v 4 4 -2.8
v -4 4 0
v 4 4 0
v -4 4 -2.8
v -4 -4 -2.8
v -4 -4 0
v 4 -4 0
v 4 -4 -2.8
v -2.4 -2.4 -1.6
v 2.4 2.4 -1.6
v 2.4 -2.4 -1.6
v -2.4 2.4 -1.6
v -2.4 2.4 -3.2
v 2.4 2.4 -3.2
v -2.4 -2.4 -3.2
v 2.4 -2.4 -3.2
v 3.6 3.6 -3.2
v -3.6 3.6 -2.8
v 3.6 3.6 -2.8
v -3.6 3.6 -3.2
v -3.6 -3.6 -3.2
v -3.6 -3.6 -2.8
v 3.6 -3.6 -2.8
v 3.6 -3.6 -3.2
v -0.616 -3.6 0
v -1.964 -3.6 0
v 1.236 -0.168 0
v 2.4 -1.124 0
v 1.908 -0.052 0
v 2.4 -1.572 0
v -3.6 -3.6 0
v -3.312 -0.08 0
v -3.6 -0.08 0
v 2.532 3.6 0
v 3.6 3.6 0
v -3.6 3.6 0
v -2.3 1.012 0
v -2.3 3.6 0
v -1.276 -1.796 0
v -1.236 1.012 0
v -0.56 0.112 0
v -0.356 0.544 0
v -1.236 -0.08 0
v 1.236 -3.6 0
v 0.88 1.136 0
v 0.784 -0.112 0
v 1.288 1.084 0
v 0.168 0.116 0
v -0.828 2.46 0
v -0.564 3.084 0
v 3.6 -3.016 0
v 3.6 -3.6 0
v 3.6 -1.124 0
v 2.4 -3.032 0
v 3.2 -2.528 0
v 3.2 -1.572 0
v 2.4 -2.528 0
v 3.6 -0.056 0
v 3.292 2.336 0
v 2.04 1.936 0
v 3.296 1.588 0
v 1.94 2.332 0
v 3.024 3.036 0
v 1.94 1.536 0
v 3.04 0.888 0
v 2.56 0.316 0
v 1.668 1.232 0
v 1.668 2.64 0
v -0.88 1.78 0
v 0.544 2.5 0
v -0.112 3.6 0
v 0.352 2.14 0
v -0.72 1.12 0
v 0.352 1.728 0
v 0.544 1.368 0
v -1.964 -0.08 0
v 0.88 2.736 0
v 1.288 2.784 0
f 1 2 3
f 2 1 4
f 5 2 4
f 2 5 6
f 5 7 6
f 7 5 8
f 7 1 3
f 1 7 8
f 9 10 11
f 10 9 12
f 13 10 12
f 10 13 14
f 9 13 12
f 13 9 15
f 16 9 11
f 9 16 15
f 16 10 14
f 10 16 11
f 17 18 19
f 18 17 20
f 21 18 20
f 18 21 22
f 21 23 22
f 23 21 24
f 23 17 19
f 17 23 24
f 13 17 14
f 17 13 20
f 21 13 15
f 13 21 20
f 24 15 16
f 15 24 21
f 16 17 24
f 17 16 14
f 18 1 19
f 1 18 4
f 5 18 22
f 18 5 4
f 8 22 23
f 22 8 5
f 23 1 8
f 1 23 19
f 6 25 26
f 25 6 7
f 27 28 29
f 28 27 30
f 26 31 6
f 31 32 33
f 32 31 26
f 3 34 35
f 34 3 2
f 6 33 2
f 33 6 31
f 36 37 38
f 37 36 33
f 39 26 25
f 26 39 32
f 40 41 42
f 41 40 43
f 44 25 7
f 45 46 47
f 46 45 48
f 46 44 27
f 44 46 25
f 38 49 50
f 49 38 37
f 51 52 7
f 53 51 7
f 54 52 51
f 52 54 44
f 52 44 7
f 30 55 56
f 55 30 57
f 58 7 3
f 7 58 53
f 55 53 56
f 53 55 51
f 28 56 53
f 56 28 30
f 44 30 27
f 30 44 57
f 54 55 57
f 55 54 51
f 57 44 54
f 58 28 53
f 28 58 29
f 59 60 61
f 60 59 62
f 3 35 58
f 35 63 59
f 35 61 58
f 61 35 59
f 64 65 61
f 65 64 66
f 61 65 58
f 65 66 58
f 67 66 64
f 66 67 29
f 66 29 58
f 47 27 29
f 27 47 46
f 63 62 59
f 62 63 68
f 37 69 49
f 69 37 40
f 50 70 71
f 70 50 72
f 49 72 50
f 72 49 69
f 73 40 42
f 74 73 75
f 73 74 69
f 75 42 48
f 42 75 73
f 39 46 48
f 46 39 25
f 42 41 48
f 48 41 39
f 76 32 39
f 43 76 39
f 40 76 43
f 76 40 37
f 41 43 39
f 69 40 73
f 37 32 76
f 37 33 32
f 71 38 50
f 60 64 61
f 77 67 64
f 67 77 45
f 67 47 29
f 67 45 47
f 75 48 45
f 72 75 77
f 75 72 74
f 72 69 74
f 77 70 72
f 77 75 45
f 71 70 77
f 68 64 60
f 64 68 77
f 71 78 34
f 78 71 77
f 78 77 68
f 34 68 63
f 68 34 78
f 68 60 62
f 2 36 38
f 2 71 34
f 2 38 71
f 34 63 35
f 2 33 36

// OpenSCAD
// file: ../p/4-4edge.scad
use <../lib.scad>
$fa=1; $fs=0.2;
function ldraw_lib__4_4edge(realsolid=false) = [
// 0 Circle 1.0
// 0 Name: 4-4edge.dat
// 0 Author: James Jessiman
// 0 !LDRAW_ORG Primitive UPDATE 2017-01
// 0 !LICENSE Licensed under CC BY 2.0 and CC BY 4.0 : see CAreadme.txt
// 
// 0 BFC CERTIFY CCW
  [0,"BFC","CERTIFY"],
  [0,"BFC","CCW"],
// 
// 0 !HISTORY 1998-12-15 [PTadmin] Official Update 1998-10
// 0 !HISTORY 2005-12-28 [PTadmin] Official Update 2005-01
// 0 !HISTORY 2007-06-24 [PTadmin] Header formatted for Contributor Agreement
// 0 !HISTORY 2008-07-01 [PTadmin] Official Update 2008-01
// 0 !HISTORY 2017-01-15 [Steffen] BFCed
// 0 !HISTORY 2017-12-30 [PTadmin] Official Update 2017-01
// 
// 
// 2 24 1 0 0 0.9239 0 0.3827
  [2,24,1,0,0,0.9239,0,0.3827],
// 2 24 0.9239 0 0.3827 0.7071 0 0.7071
  [2,24,0.9239,0,0.3827,0.7071,0,0.7071],
// 2 24 0.7071 0 0.7071 0.3827 0 0.9239
  [2,24,0.7071,0,0.7071,0.3827,0,0.9239],
// 2 24 0.3827 0 0.9239 0 0 1
  [2,24,0.3827,0,0.9239,0,0,1],
// 2 24 0 0 1 -0.3827 0 0.9239
  [2,24,0,0,1,-0.3827,0,0.9239],
// 2 24 -0.3827 0 0.9239 -0.7071 0 0.7071
  [2,24,-0.3827,0,0.9239,-0.7071,0,0.7071],
// 2 24 -0.7071 0 0.7071 -0.9239 0 0.3827
  [2,24,-0.7071,0,0.7071,-0.9239,0,0.3827],
// 2 24 -0.9239 0 0.3827 -1 0 -0
  [2,24,-0.9239,0,0.3827,-1,0,-0],
// 2 24 -1 0 -0 -0.9239 0 -0.3827
  [2,24,-1,0,-0,-0.9239,0,-0.3827],
// 2 24 -0.9239 0 -0.3827 -0.7071 0 -0.7071
  [2,24,-0.9239,0,-0.3827,-0.7071,0,-0.7071],
// 2 24 -0.7071 0 -0.7071 -0.3827 0 -0.9239
  [2,24,-0.7071,0,-0.7071,-0.3827,0,-0.9239],
// 2 24 -0.3827 0 -0.9239 0 0 -1
  [2,24,-0.3827,0,-0.9239,0,0,-1],
// 2 24 0 0 -1 0.3827 0 -0.9239
  [2,24,0,0,-1,0.3827,0,-0.9239],
// 2 24 0.3827 0 -0.9239 0.7071 0 -0.7071
  [2,24,0.3827,0,-0.9239,0.7071,0,-0.7071],
// 2 24 0.7071 0 -0.7071 0.9239 0 -0.3827
  [2,24,0.7071,0,-0.7071,0.9239,0,-0.3827],
// 2 24 0.9239 0 -0.3827 1 0 0
  [2,24,0.9239,0,-0.3827,1,0,0],
];
module ldraw_lib__4_4edge(step=0, col=false, unit=2/5, alt=false, line=0.2, solid=!$preview)
    makepoly(ldraw_lib__4_4edge(solid), step=step, col=col, unit=unit, alt=alt, line=line, solid=solid);
ldraw_lib__4_4edge(line=0.2);
// file: ../p/4-4disc.scad
use <../lib.scad>
$fa=1; $fs=0.2;
function ldraw_lib__4_4disc(realsolid=false) = [
// 0 Disc 1.0
// 0 Name: 4-4disc.dat
// 0 Author: James Jessiman
// 0 !LDRAW_ORG Primitive UPDATE 2002-02
// 0 !LICENSE Licensed under CC BY 2.0 and CC BY 4.0 : see CAreadme.txt
// 
// 0 BFC CERTIFY CCW
  [0,"BFC","CERTIFY"],
  [0,"BFC","CCW"],
// 
// 0 !HISTORY 1998-12-15 [PTadmin] Official Update 1998-10
// 0 !HISTORY 2002-03-23 [sbliss] Added BFC statement
// 0 !HISTORY 2002-04-25 [PTadmin] Official Update 2002-02
// 0 !HISTORY 2007-06-24 [PTadmin] Header formatted for Contributor Agreement
// 0 !HISTORY 2008-07-01 [PTadmin] Official Update 2008-01
// 
// 
// 3 16 0 0 0 1 0 0 0.9239 0 0.3827
  [3,16,0,0,0,1,0,0,0.9239,0,0.3827],
// 3 16 0 0 0 0.9239 0 0.3827 0.7071 0 0.7071
  [3,16,0,0,0,0.9239,0,0.3827,0.7071,0,0.7071],
// 3 16 0 0 0 0.7071 0 0.7071 0.3827 0 0.9239
  [3,16,0,0,0,0.7071,0,0.7071,0.3827,0,0.9239],
// 3 16 0 0 0 0.3827 0 0.9239 0 0 1
  [3,16,0,0,0,0.3827,0,0.9239,0,0,1],
// 3 16 0 0 0 0 0 1 -0.3827 0 0.9239
  [3,16,0,0,0,0,0,1,-0.3827,0,0.9239],
// 3 16 0 0 0 -0.3827 0 0.9239 -0.7071 0 0.7071
  [3,16,0,0,0,-0.3827,0,0.9239,-0.7071,0,0.7071],
// 3 16 0 0 0 -0.7071 0 0.7071 -0.9239 0 0.3827
  [3,16,0,0,0,-0.7071,0,0.7071,-0.9239,0,0.3827],
// 3 16 0 0 0 -0.9239 0 0.3827 -1 0 -0
  [3,16,0,0,0,-0.9239,0,0.3827,-1,0,-0],
// 3 16 0 0 0 -1 0 -0 -0.9239 0 -0.3827
  [3,16,0,0,0,-1,0,-0,-0.9239,0,-0.3827],
// 3 16 0 0 0 -0.9239 0 -0.3827 -0.7071 0 -0.7071
  [3,16,0,0,0,-0.9239,0,-0.3827,-0.7071,0,-0.7071],
// 3 16 0 0 0 -0.7071 0 -0.7071 -0.3827 0 -0.9239
  [3,16,0,0,0,-0.7071,0,-0.7071,-0.3827,0,-0.9239],
// 3 16 0 0 0 -0.3827 0 -0.9239 0 0 -1
  [3,16,0,0,0,-0.3827,0,-0.9239,0,0,-1],
// 3 16 0 0 0 0 0 -1 0.3827 0 -0.9239
  [3,16,0,0,0,0,0,-1,0.3827,0,-0.9239],
// 3 16 0 0 0 0.3827 0 -0.9239 0.7071 0 -0.7071
  [3,16,0,0,0,0.3827,0,-0.9239,0.7071,0,-0.7071],
// 3 16 0 0 0 0.7071 0 -0.7071 0.9239 0 -0.3827
  [3,16,0,0,0,0.7071,0,-0.7071,0.9239,0,-0.3827],
// 3 16 0 0 0 0.9239 0 -0.3827 1 0 0
  [3,16,0,0,0,0.9239,0,-0.3827,1,0,0],
// 0
];
module ldraw_lib__4_4disc(step=0, col=false, unit=2/5, alt=false, line=0.2, solid=!$preview)
    makepoly(ldraw_lib__4_4disc(solid), step=step, col=col, unit=unit, alt=alt, line=line, solid=solid);
ldraw_lib__4_4disc(line=0.2);
// file: ../p/4-4cyli.scad
use <../lib.scad>
$fa=1; $fs=0.2;
function ldraw_lib__4_4cyli(realsolid=false) = [
// 0 Cylinder 1.0
// 0 Name: 4-4cyli.dat
// 0 Author: James Jessiman
// 0 !LDRAW_ORG Primitive UPDATE 2005-01
// 0 !LICENSE Licensed under CC BY 2.0 and CC BY 4.0 : see CAreadme.txt
// 
// 0 BFC CERTIFY CCW
  [0,"BFC","CERTIFY"],
  [0,"BFC","CCW"],
// 
// 0 !HISTORY 1998-12-15 [PTadmin] Official Update 1998-10
// 0 !HISTORY 2002-03-23 [sbliss] Added BFC statement; merged headers from files in distributions LDraw 0.27 and Complete.
// 0 !HISTORY 2002-04-25 [PTadmin] Official Update 2002-02
// 0 !HISTORY 2004-12-14 [guyvivan] BFC CCW
// 0 !HISTORY 2005-12-28 [PTadmin] Official Update 2005-01
// 0 !HISTORY 2007-06-24 [PTadmin] Header formatted for Contributor Agreement
// 0 !HISTORY 2008-07-01 [PTadmin] Official Update 2008-01
// 
// 
// 4 16 1 1 0 0.9239 1 0.3827 0.9239 0 0.3827 1 0 0
  [4,16,1,1,0,0.9239,1,0.3827,0.9239,0,0.3827,1,0,0],
// 5 24 1 0 0 1 1 0 0.9239 0 0.3827 0.9239 0 -0.3827
  [5,24,1,0,0,1,1,0,0.9239,0,0.3827,0.9239,0,-0.3827],
// 4 16 0.9239 1 0.3827 0.7071 1 0.7071 0.7071 0 0.7071 0.9239 0 0.3827
  [4,16,0.9239,1,0.3827,0.7071,1,0.7071,0.7071,0,0.7071,0.9239,0,0.3827],
// 5 24 0.9239 0 0.3827 0.9239 1 0.3827 0.7071 0 0.7071 1 0 0
  [5,24,0.9239,0,0.3827,0.9239,1,0.3827,0.7071,0,0.7071,1,0,0],
// 4 16 0.7071 1 0.7071 0.3827 1 0.9239 0.3827 0 0.9239 0.7071 0 0.7071
  [4,16,0.7071,1,0.7071,0.3827,1,0.9239,0.3827,0,0.9239,0.7071,0,0.7071],
// 5 24 0.7071 0 0.7071 0.7071 1 0.7071 0.3827 0 0.9239 0.9239 0 0.3827
  [5,24,0.7071,0,0.7071,0.7071,1,0.7071,0.3827,0,0.9239,0.9239,0,0.3827],
// 4 16 0.3827 1 0.9239 0 1 1 0 0 1 0.3827 0 0.9239
  [4,16,0.3827,1,0.9239,0,1,1,0,0,1,0.3827,0,0.9239],
// 5 24 0.3827 0 0.9239 0.3827 1 0.9239 0 0 1 0.7071 0 0.7071
  [5,24,0.3827,0,0.9239,0.3827,1,0.9239,0,0,1,0.7071,0,0.7071],
// 4 16 0 1 1 -0.3827 1 0.9239 -0.3827 0 0.9239 0 0 1
  [4,16,0,1,1,-0.3827,1,0.9239,-0.3827,0,0.9239,0,0,1],
// 5 24 0 0 1 0 1 1 -0.3827 0 0.9239 0.3827 0 0.9239
  [5,24,0,0,1,0,1,1,-0.3827,0,0.9239,0.3827,0,0.9239],
// 4 16 -0.3827 1 0.9239 -0.7071 1 0.7071 -0.7071 0 0.7071 -0.3827 0 0.9239
  [4,16,-0.3827,1,0.9239,-0.7071,1,0.7071,-0.7071,0,0.7071,-0.3827,0,0.9239],
// 5 24 -0.3827 0 0.9239 -0.3827 1 0.9239 -0.7071 0 0.7071 0 0 1
  [5,24,-0.3827,0,0.9239,-0.3827,1,0.9239,-0.7071,0,0.7071,0,0,1],
// 4 16 -0.7071 1 0.7071 -0.9239 1 0.3827 -0.9239 0 0.3827 -0.7071 0 0.7071
  [4,16,-0.7071,1,0.7071,-0.9239,1,0.3827,-0.9239,0,0.3827,-0.7071,0,0.7071],
// 5 24 -0.7071 0 0.7071 -0.7071 1 0.7071 -0.9239 0 0.3827 -0.3827 0 0.9239
  [5,24,-0.7071,0,0.7071,-0.7071,1,0.7071,-0.9239,0,0.3827,-0.3827,0,0.9239],
// 4 16 -0.9239 1 0.3827 -1 1 0 -1 0 0 -0.9239 0 0.3827
  [4,16,-0.9239,1,0.3827,-1,1,0,-1,0,0,-0.9239,0,0.3827],
// 5 24 -0.9239 0 0.3827 -0.9239 1 0.3827 -1 0 0 -0.7071 0 0.7071
  [5,24,-0.9239,0,0.3827,-0.9239,1,0.3827,-1,0,0,-0.7071,0,0.7071],
// 4 16 -1 1 0 -0.9239 1 -0.3827 -0.9239 0 -0.3827 -1 0 0
  [4,16,-1,1,0,-0.9239,1,-0.3827,-0.9239,0,-0.3827,-1,0,0],
// 5 24 -1 0 0 -1 1 0 -0.9239 0 -0.3827 -0.9239 0 0.3827
  [5,24,-1,0,0,-1,1,0,-0.9239,0,-0.3827,-0.9239,0,0.3827],
// 4 16 -0.9239 1 -0.3827 -0.7071 1 -0.7071 -0.7071 0 -0.7071 -0.9239 0 -0.3827
  [4,16,-0.9239,1,-0.3827,-0.7071,1,-0.7071,-0.7071,0,-0.7071,-0.9239,0,-0.3827],
// 5 24 -0.9239 0 -0.3827 -0.9239 1 -0.3827 -0.7071 0 -0.7071 -1 0 0
  [5,24,-0.9239,0,-0.3827,-0.9239,1,-0.3827,-0.7071,0,-0.7071,-1,0,0],
// 4 16 -0.7071 1 -0.7071 -0.3827 1 -0.9239 -0.3827 0 -0.9239 -0.7071 0 -0.7071
  [4,16,-0.7071,1,-0.7071,-0.3827,1,-0.9239,-0.3827,0,-0.9239,-0.7071,0,-0.7071],
// 5 24 -0.7071 0 -0.7071 -0.7071 1 -0.7071 -0.3827 0 -0.9239 -0.9239 0 -0.3827
  [5,24,-0.7071,0,-0.7071,-0.7071,1,-0.7071,-0.3827,0,-0.9239,-0.9239,0,-0.3827],
// 4 16 -0.3827 1 -0.9239 0 1 -1 0 0 -1 -0.3827 0 -0.9239
  [4,16,-0.3827,1,-0.9239,0,1,-1,0,0,-1,-0.3827,0,-0.9239],
// 5 24 -0.3827 0 -0.9239 -0.3827 1 -0.9239 0 0 -1 -0.7071 0 -0.7071
  [5,24,-0.3827,0,-0.9239,-0.3827,1,-0.9239,0,0,-1,-0.7071,0,-0.7071],
// 4 16 0 1 -1 0.3827 1 -0.9239 0.3827 0 -0.9239 0 0 -1
  [4,16,0,1,-1,0.3827,1,-0.9239,0.3827,0,-0.9239,0,0,-1],
// 5 24 0 0 -1 0 1 -1 0.3827 0 -0.9239 -0.3827 0 -0.9239
  [5,24,0,0,-1,0,1,-1,0.3827,0,-0.9239,-0.3827,0,-0.9239],
// 4 16 0.3827 1 -0.9239 0.7071 1 -0.7071 0.7071 0 -0.7071 0.3827 0 -0.9239
  [4,16,0.3827,1,-0.9239,0.7071,1,-0.7071,0.7071,0,-0.7071,0.3827,0,-0.9239],
// 5 24 0.3827 0 -0.9239 0.3827 1 -0.9239 0.7071 0 -0.7071 0 0 -1
  [5,24,0.3827,0,-0.9239,0.3827,1,-0.9239,0.7071,0,-0.7071,0,0,-1],
// 4 16 0.7071 1 -0.7071 0.9239 1 -0.3827 0.9239 0 -0.3827 0.7071 0 -0.7071
  [4,16,0.7071,1,-0.7071,0.9239,1,-0.3827,0.9239,0,-0.3827,0.7071,0,-0.7071],
// 5 24 0.7071 0 -0.7071 0.7071 1 -0.7071 0.9239 0 -0.3827 0.3827 0 -0.9239
  [5,24,0.7071,0,-0.7071,0.7071,1,-0.7071,0.9239,0,-0.3827,0.3827,0,-0.9239],
// 4 16 0.9239 1 -0.3827 1 1 0 1 0 0 0.9239 0 -0.3827
  [4,16,0.9239,1,-0.3827,1,1,0,1,0,0,0.9239,0,-0.3827],
// 5 24 0.9239 0 -0.3827 0.9239 1 -0.3827 1 0 0 0.7071 0 -0.7071
  [5,24,0.9239,0,-0.3827,0.9239,1,-0.3827,1,0,0,0.7071,0,-0.7071],
// 0
];
module ldraw_lib__4_4cyli(step=0, col=false, unit=2/5, alt=false, line=0.2, solid=!$preview)
    makepoly(ldraw_lib__4_4cyli(solid), step=step, col=col, unit=unit, alt=alt, line=line, solid=solid);
ldraw_lib__4_4cyli(line=0.2);
// file: ../p/stud3.scad
use <../lib.scad>
use <4-4cyli.scad>
use <4-4disc.scad>
use <4-4edge.scad>
$fa=1; $fs=0.2;
function ldraw_lib__stud3(realsolid=false) = realsolid ? 
    [openscad(translate([0,0,-eps()], o=cylinder(4+eps(), r=4)),2)] : [
// 0 Stud Tube Solid
// 0 Name: stud3.dat
// 0 Author: James Jessiman
// 0 !LDRAW_ORG Primitive UPDATE 2012-01
// 0 !LICENSE Licensed under CC BY 2.0 and CC BY 4.0 : see CAreadme.txt
// 
// 0 BFC CERTIFY CCW
  [0,"BFC","CERTIFY"],
  [0,"BFC","CCW"],
// 
// 0 !HISTORY 2002-04-04 [sbliss] Modified for BFC compliance
// 0 !HISTORY 2002-04-25 [PTadmin] Official Update 2002-02
// 0 !HISTORY 2007-06-24 [PTadmin] Header formatted for Contributor Agreement
// 0 !HISTORY 2008-07-01 [PTadmin] Official Update 2008-01
// 0 !HISTORY 2012-02-16 [Philo] Changed to CCW
// 0 !HISTORY 2012-03-30 [PTadmin] Official Update 2012-01
// 
// 
// 1 16 0 -4 0 4 0 0 0 1 0 0 0 4 4-4edge.dat
  [1,16,0,-4,0,4,0,0,0,1,0,0,0,4, ldraw_lib__4_4edge(realsolid)],
// 1 16 0 0 0 4 0 0 0 1 0 0 0 4 4-4edge.dat
  [1,16,0,0,0,4,0,0,0,1,0,0,0,4, ldraw_lib__4_4edge(realsolid)],
// 1 16 0 -4 0 4 0 0 0 1 0 0 0 4 4-4disc.dat
  [1,16,0,-4,0,4,0,0,0,1,0,0,0,4, ldraw_lib__4_4disc(realsolid)],
// 1 16 0 -4 0 4 0 0 0 4 0 0 0 4 4-4cyli.dat
  [1,16,0,-4,0,4,0,0,0,4,0,0,0,4, ldraw_lib__4_4cyli(realsolid)],
];
module ldraw_lib__stud3(step=0, col=false, unit=2/5, alt=false, line=0.2, solid=!$preview)
    makepoly(ldraw_lib__stud3(solid), step=step, col=col, unit=unit, alt=alt, line=line, solid=solid);
ldraw_lib__stud3(line=0.2);
// file: ../p/stud.scad
use <../lib.scad>
use <4-4cyli.scad>
use <4-4disc.scad>
use <4-4edge.scad>
$fa=1; $fs=0.2;
function ldraw_lib__stud(realsolid=false) = realsolid ? 
    [openscad(translate([0,0,-eps()], o=cylinder(4+eps(), r=6)),2)] : [
// 0 Stud
// 0 Name: stud.dat
// 0 Author: James Jessiman
// 0 !LDRAW_ORG Primitive UPDATE 2012-01
// 0 !LICENSE Licensed under CC BY 2.0 and CC BY 4.0 : see CAreadme.txt
// 
// 0 BFC CERTIFY CCW
  [0,"BFC","CERTIFY"],
  [0,"BFC","CCW"],
// 
// 0 !HISTORY 2002-04-04 [sbliss] Modified for BFC compliance
// 0 !HISTORY 2002-04-25 [PTadmin] Official Update 2002-02
// 0 !HISTORY 2007-06-24 [PTadmin] Header formatted for Contributor Agreement
// 0 !HISTORY 2008-07-01 [PTadmin] Official Update 2008-01
// 0 !HISTORY 2012-02-16 [Philo] Changed to CCW
// 0 !HISTORY 2012-03-30 [PTadmin] Official Update 2012-01
// 
// 
// 1 16 0 0 0 6 0 0 0 1 0 0 0 6 4-4edge.dat
  [1,16,0,0,0,6,0,0,0,1,0,0,0,6, ldraw_lib__4_4edge(realsolid)],
// 1 16 0 -4 0 6 0 0 0 1 0 0 0 6 4-4edge.dat
  [1,16,0,-4,0,6,0,0,0,1,0,0,0,6, ldraw_lib__4_4edge(realsolid)],
// 1 16 0 0 0 6 0 0 0 -4 0 0 0 6 4-4cyli.dat
  [1,16,0,0,0,6,0,0,0,-4,0,0,0,6, ldraw_lib__4_4cyli(realsolid)],
// 1 16 0 -4 0 6 0 0 0 1 0 0 0 6 4-4disc.dat
  [1,16,0,-4,0,6,0,0,0,1,0,0,0,6, ldraw_lib__4_4disc(realsolid)],
];
module ldraw_lib__stud(step=0, col=false, unit=2/5, alt=false, line=0.2, solid=!$preview)
    makepoly(ldraw_lib__stud(solid), step=step, col=col, unit=unit, alt=alt, line=line, solid=solid);
ldraw_lib__stud(line=0.2);
// file: ../p/box4t.scad
use <../lib.scad>
$fa=1; $fs=0.2;
function ldraw_lib__box4t(realsolid=false) = [
// 0 Box with 4 Adjacent Faces and All Edges
// 0 Name: box4t.dat
// 0 Author: Tore Eriksson [Tore_Eriksson]
// 0 !LDRAW_ORG Primitive UPDATE 2003-02
// 0 !LICENSE Licensed under CC BY 2.0 and CC BY 4.0 : see CAreadme.txt
// 
// 0 BFC CERTIFY CCW
  [0,"BFC","CERTIFY"],
  [0,"BFC","CCW"],
// 
// 0 !HISTORY 1997-09-29 [PTadmin] Official Update 1997-15
// 0 !HISTORY 2002-08-31 [izanette] Modified with WINDZ for BFC compliance
// 0 !HISTORY 2003-08-01 [PTadmin] Official Update 2003-02
// 0 !HISTORY 2007-06-24 [PTadmin] Header formatted for Contributor Agreement
// 0 !HISTORY 2008-07-01 [PTadmin] Official Update 2008-01
// 
// 
// 2 24 1 1 1 -1 1 1
  [2,24,1,1,1,-1,1,1],
// 2 24 -1 1 1 -1 1 -1
  [2,24,-1,1,1,-1,1,-1],
// 2 24 -1 1 -1 1 1 -1
  [2,24,-1,1,-1,1,1,-1],
// 2 24 1 1 -1 1 1 1
  [2,24,1,1,-1,1,1,1],
// 2 24 1 0 1 -1 0 1
  [2,24,1,0,1,-1,0,1],
// 2 24 -1 0 1 -1 0 -1
  [2,24,-1,0,1,-1,0,-1],
// 2 24 -1 0 -1 1 0 -1
  [2,24,-1,0,-1,1,0,-1],
// 2 24 1 0 -1 1 0 1
  [2,24,1,0,-1,1,0,1],
// 2 24 1 0 1 1 1 1
  [2,24,1,0,1,1,1,1],
// 2 24 -1 0 1 -1 1 1
  [2,24,-1,0,1,-1,1,1],
// 2 24 1 0 -1 1 1 -1
  [2,24,1,0,-1,1,1,-1],
// 2 24 -1 0 -1 -1 1 -1
  [2,24,-1,0,-1,-1,1,-1],
// 4 16 1 1 1 1 1 -1 -1 1 -1 -1 1 1
  [4,16,1,1,1,1,1,-1,-1,1,-1,-1,1,1],
// 4 16 1 1 1 -1 1 1 -1 0 1 1 0 1
  [4,16,1,1,1,-1,1,1,-1,0,1,1,0,1],
// 4 16 -1 1 1 -1 1 -1 -1 0 -1 -1 0 1
  [4,16,-1,1,1,-1,1,-1,-1,0,-1,-1,0,1],
// 0 4 16 -1 1 -1 -1 0 -1 1 0 -1 1 1 -1
// 4 16 1 1 -1 1 1 1 1 0 1 1 0 -1
  [4,16,1,1,-1,1,1,1,1,0,1,1,0,-1],
// 0
];
module ldraw_lib__box4t(step=0, col=false, unit=2/5, alt=false, line=0.2, solid=!$preview)
    makepoly(ldraw_lib__box4t(solid), step=step, col=col, unit=unit, alt=alt, line=line, solid=solid);
ldraw_lib__box4t(line=0.2);
// file: s/3004s01.scad
use <../../lib.scad>
use <../../p/box4t.scad>
use <../../p/box5.scad>
use <../../p/stud.scad>
use <../../p/stud3.scad>
$fa=1; $fs=0.2;
function ldraw_lib__s__3004s01(realsolid=false) = [
// 0 ~Brick  1 x  2 without Front Face
// 0 Name: s\3004s01.dat
// 0 Author: James Jessiman
// 0 !LDRAW_ORG Subpart UPDATE 2003-03
// 0 !LICENSE Licensed under CC BY 2.0 and CC BY 4.0 : see CAreadme.txt
// 
// 0 BFC CERTIFY CCW
  [0,"BFC","CERTIFY"],
  [0,"BFC","CCW"],
// 
// 0 !HISTORY 2003-09-07 [jriley] Subfiling, BFC
// 0 !HISTORY 2003-12-19 [PTadmin] Official Update 2003-03
// 0 !HISTORY 2007-08-29 [PTadmin] Header formatted for Contributor Agreement
// 0 !HISTORY 2008-07-01 [PTadmin] Official Update 2008-01
// 
// 
// 1 16 0 4 0 1 0 0 0 -5 0 0 0 1 stud3.dat
  [1,16,0,4,0,1,0,0,0,-5,0,0,0,1, ldraw_lib__stud3(realsolid)],
// 0 BFC INVERTNEXT
  [0,"BFC","INVERTNEXT"],
// 1 16 0 24 0 16 0 0 0 -20 0 0 0 6 box5.dat
  [1,16,0,24,0,16,0,0,0,-20,0,0,0,6, ldraw_lib__box5(realsolid)],
// 4 16 20 24 10 16 24 6 -16 24 6 -20 24 10
  [4,16,20,24,10,16,24,6,-16,24,6,-20,24,10],
// 4 16 -20 24 10 -16 24 6 -16 24 -6 -20 24 -10
  [4,16,-20,24,10,-16,24,6,-16,24,-6,-20,24,-10],
// 4 16 -20 24 -10 -16 24 -6 16 24 -6 20 24 -10
  [4,16,-20,24,-10,-16,24,-6,16,24,-6,20,24,-10],
// 4 16 20 24 -10 16 24 -6 16 24 6 20 24 10
  [4,16,20,24,-10,16,24,-6,16,24,6,20,24,10],
// 1 16 0 24 0 20 0 0 0 -24 0 0 0 10 box4t.dat
  [1,16,0,24,0,20,0,0,0,-24,0,0,0,10, ldraw_lib__box4t(realsolid)],
// 1 16 10 0 0 1 0 0 0 1 0 0 0 1 stud.dat
  [1,16,10,0,0,1,0,0,0,1,0,0,0,1, ldraw_lib__stud(realsolid)],
// 1 16 -10 0 0 1 0 0 0 1 0 0 0 1 stud.dat
  [1,16,-10,0,0,1,0,0,0,1,0,0,0,1, ldraw_lib__stud(realsolid)],
// 0
];
module ldraw_lib__s__3004s01(step=0, col=false, unit=2/5, alt=false, line=0.2, solid=!$preview)
    makepoly(ldraw_lib__s__3004s01(solid), step=step, col=col, unit=unit, alt=alt, line=line, solid=solid);
ldraw_lib__s__3004s01(line=0.2);
// file: ../p/box5.scad
use <../lib.scad>
$fa=1; $fs=0.2;
function ldraw_lib__box5(realsolid=false) = [
// 0 Box with 5 Faces and All Edges
// 0 Name: box5.dat
// 0 Author: James Jessiman
// 0 !LDRAW_ORG Primitive UPDATE 2012-01
// 0 !LICENSE Licensed under CC BY 2.0 and CC BY 4.0 : see CAreadme.txt
// 
// 0 BFC CERTIFY CCW
  [0,"BFC","CERTIFY"],
  [0,"BFC","CCW"],
// 
// 0 !HISTORY 2002-04-03 [sbliss] Modified for BFC compliance
// 0 !HISTORY 2002-04-25 [PTadmin] Official Update 2002-02
// 0 !HISTORY 2007-06-24 [PTadmin] Header formatted for Contributor Agreement
// 0 !HISTORY 2008-07-01 [PTadmin] Official Update 2008-01
// 0 !HISTORY 2012-02-16 [Philo] Changed to CCW
// 0 !HISTORY 2012-03-30 [PTadmin] Official Update 2012-01
// 
// 
// 2 24 1 1 1 -1 1 1
  [2,24,1,1,1,-1,1,1],
// 2 24 -1 1 1 -1 1 -1
  [2,24,-1,1,1,-1,1,-1],
// 2 24 -1 1 -1 1 1 -1
  [2,24,-1,1,-1,1,1,-1],
// 2 24 1 1 -1 1 1 1
  [2,24,1,1,-1,1,1,1],
// 2 24 1 0 1 -1 0 1
  [2,24,1,0,1,-1,0,1],
// 2 24 -1 0 1 -1 0 -1
  [2,24,-1,0,1,-1,0,-1],
// 2 24 -1 0 -1 1 0 -1
  [2,24,-1,0,-1,1,0,-1],
// 2 24 1 0 -1 1 0 1
  [2,24,1,0,-1,1,0,1],
// 2 24 1 0 1 1 1 1
  [2,24,1,0,1,1,1,1],
// 2 24 -1 0 1 -1 1 1
  [2,24,-1,0,1,-1,1,1],
// 2 24 1 0 -1 1 1 -1
  [2,24,1,0,-1,1,1,-1],
// 2 24 -1 0 -1 -1 1 -1
  [2,24,-1,0,-1,-1,1,-1],
// 4 16 -1 1 1 1 1 1 1 1 -1 -1 1 -1
  [4,16,-1,1,1,1,1,1,1,1,-1,-1,1,-1],
// 4 16 -1 1 1 -1 0 1 1 0 1 1 1 1
  [4,16,-1,1,1,-1,0,1,1,0,1,1,1,1],
// 4 16 -1 1 -1 -1 0 -1 -1 0 1 -1 1 1
  [4,16,-1,1,-1,-1,0,-1,-1,0,1,-1,1,1],
// 4 16 1 1 -1 1 0 -1 -1 0 -1 -1 1 -1
  [4,16,1,1,-1,1,0,-1,-1,0,-1,-1,1,-1],
// 4 16 1 1 1 1 0 1 1 0 -1 1 1 -1
  [4,16,1,1,1,1,0,1,1,0,-1,1,1,-1],
];
module ldraw_lib__box5(step=0, col=false, unit=2/5, alt=false, line=0.2, solid=!$preview)
    makepoly(ldraw_lib__box5(solid), step=step, col=col, unit=unit, alt=alt, line=line, solid=solid);
ldraw_lib__box5(line=0.2);
// file: ../p/box4.scad
use <../lib.scad>
$fa=1; $fs=0.2;
function ldraw_lib__box4(realsolid=false) = [
// 0 Box with 4 Faces (2 Parallel Pairs) and All Edges
// 0 Name: box4.dat
// 0 Author: James Jessiman
// 0 !LDRAW_ORG Primitive UPDATE 2012-01
// 0 !LICENSE Licensed under CC BY 2.0 and CC BY 4.0 : see CAreadme.txt
// 
// 0 BFC CERTIFY CCW
  [0,"BFC","CERTIFY"],
  [0,"BFC","CCW"],
// 
// 0 !HISTORY 2002-04-03 [sbliss] Modified for BFC compliance
// 0 !HISTORY 2002-04-25 [PTadmin] Official Update 2002-02
// 0 !HISTORY 2007-06-24 [PTadmin] Header formatted for Contributor Agreement
// 0 !HISTORY 2008-07-01 [PTadmin] Official Update 2008-01
// 0 !HISTORY 2012-02-16 [Philo] Changed to CCW
// 0 !HISTORY 2012-03-30 [PTadmin] Official Update 2012-01
// 
// 
// 2 24 1 1 1 -1 1 1
  [2,24,1,1,1,-1,1,1],
// 2 24 -1 1 1 -1 1 -1
  [2,24,-1,1,1,-1,1,-1],
// 2 24 -1 1 -1 1 1 -1
  [2,24,-1,1,-1,1,1,-1],
// 2 24 1 1 -1 1 1 1
  [2,24,1,1,-1,1,1,1],
// 2 24 1 0 1 -1 0 1
  [2,24,1,0,1,-1,0,1],
// 2 24 -1 0 1 -1 0 -1
  [2,24,-1,0,1,-1,0,-1],
// 2 24 -1 0 -1 1 0 -1
  [2,24,-1,0,-1,1,0,-1],
// 2 24 1 0 -1 1 0 1
  [2,24,1,0,-1,1,0,1],
// 2 24 1 0 1 1 1 1
  [2,24,1,0,1,1,1,1],
// 2 24 -1 0 1 -1 1 1
  [2,24,-1,0,1,-1,1,1],
// 2 24 1 0 -1 1 1 -1
  [2,24,1,0,-1,1,1,-1],
// 2 24 -1 0 -1 -1 1 -1
  [2,24,-1,0,-1,-1,1,-1],
// 4 16 -1 1 1 -1 0 1 1 0 1 1 1 1
  [4,16,-1,1,1,-1,0,1,1,0,1,1,1,1],
// 4 16 -1 1 -1 -1 0 -1 -1 0 1 -1 1 1
  [4,16,-1,1,-1,-1,0,-1,-1,0,1,-1,1,1],
// 4 16 1 1 -1 1 0 -1 -1 0 -1 -1 1 -1
  [4,16,1,1,-1,1,0,-1,-1,0,-1,-1,1,-1],
// 4 16 1 1 1 1 0 1 1 0 -1 1 1 -1
  [4,16,1,1,1,1,0,1,1,0,-1,1,1,-1],
];
module ldraw_lib__box4(step=0, col=false, unit=2/5, alt=false, line=0.2, solid=!$preview)
    makepoly(ldraw_lib__box4(solid), step=step, col=col, unit=unit, alt=alt, line=line, solid=solid);
ldraw_lib__box4(line=0.2);
// file: 3004.scad
use <../lib.scad>
use <s/3004s01.scad>
$fa=1; $fs=0.2;
function ldraw_lib__3004(realsolid=false) = [
// 0 Brick  1 x  2
// 0 Name: 3004.dat
// 0 Author: James Jessiman
// 0 !LDRAW_ORG Part UPDATE 2022-05
// 0 !LICENSE Licensed under CC BY 2.0 and CC BY 4.0 : see CAreadme.txt
// 
// 0 BFC CERTIFY CCW
  [0,"BFC","CERTIFY"],
  [0,"BFC","CCW"],
// 
// 0 !HISTORY 2001-10-26 [PTadmin] Official Update 2001-01
// 0 !HISTORY 2002-05-07 {unknown} BFC Certification
// 0 !HISTORY 2002-06-11 [PTadmin] Official Update 2002-03
// 0 !HISTORY 2007-05-07 [PTadmin] Header formatted for Contributor Agreement
// 0 !HISTORY 2008-07-01 [PTadmin] Official Update 2008-01
// 0 !HISTORY 2022-08-04 [MagFors] Using subfile
// 0 !HISTORY 2022-09-15 [PTadmin] Official Update 2022-05
// 
// 
// 1 16 0 0 0 1 0 0 0 1 0 0 0 1 s\3004s01.dat
  [1,16,0,0,0,1,0,0,0,1,0,0,0,1, ldraw_lib__s__3004s01(realsolid)],
// 4 16 -20 24 -10 20 24 -10 20 0 -10 -20 0 -10
  [4,16,-20,24,-10,20,24,-10,20,0,-10,-20,0,-10],
];
module ldraw_lib__3004(step=0, col=false, unit=2/5, alt=false, line=0.2, solid=!$preview)
    makepoly(ldraw_lib__3004(solid), step=step, col=col, unit=unit, alt=alt, line=line, solid=solid);
ldraw_lib__3004(line=0.2);
// file: s/3070bs01.scad
use <../../lib.scad>
use <../../p/box4.scad>
use <../../p/box5.scad>
$fa=1; $fs=0.2;
function ldraw_lib__s__3070bs01(realsolid=false) = [
// 0 ~Tile  1 x  1 with Groove without Top Face
// 0 Name: s\3070bs01.dat
// 0 Author: Chris Dee [cwdee]
// 0 !LDRAW_ORG Subpart UPDATE 2009-02
// 0 !LICENSE Licensed under CC BY 2.0 and CC BY 4.0 : see CAreadme.txt
// 
// 0 BFC CERTIFY CCW
  [0,"BFC","CERTIFY"],
  [0,"BFC","CCW"],
// 
// 0 !HISTORY 2009-09-03 [PTadmin] Official Update 2009-02
// 
// 
// 1 16 0 0 0 10 0 0 0 7 0 0 0 10 box4.dat
  [1,16,0,0,0,10,0,0,0,7,0,0,0,10, ldraw_lib__box4(realsolid)],
// 0 BFC INVERTNEXT
  [0,"BFC","INVERTNEXT"],
// 1 16 0 8 0 6 0 0 0 -4 0 0 0 6 box5.dat
  [1,16,0,8,0,6,0,0,0,-4,0,0,0,6, ldraw_lib__box5(realsolid)],
// 1 16 0 7 0 9 0 0 0 1 0 0 0 9 box4.dat
  [1,16,0,7,0,9,0,0,0,1,0,0,0,9, ldraw_lib__box4(realsolid)],
// 
// 4 16 9 8 9 6 8 6 -6 8 6 -9 8 9
  [4,16,9,8,9,6,8,6,-6,8,6,-9,8,9],
// 4 16 -9 8 9 -6 8 6 -6 8 -6 -9 8 -9
  [4,16,-9,8,9,-6,8,6,-6,8,-6,-9,8,-9],
// 4 16 -9 8 -9 -6 8 -6 6 8 -6 9 8 -9
  [4,16,-9,8,-9,-6,8,-6,6,8,-6,9,8,-9],
// 4 16 9 8 -9 6 8 -6 6 8 6 9 8 9
  [4,16,9,8,-9,6,8,-6,6,8,6,9,8,9],
// 
// 4 16 10 7 10 9 7 9 -9 7 9 -10 7 10
  [4,16,10,7,10,9,7,9,-9,7,9,-10,7,10],
// 4 16 -10 7 10 -9 7 9 -9 7 -9 -10 7 -10
  [4,16,-10,7,10,-9,7,9,-9,7,-9,-10,7,-10],
// 4 16 -10 7 -10 -9 7 -9 9 7 -9 10 7 -10
  [4,16,-10,7,-10,-9,7,-9,9,7,-9,10,7,-10],
// 4 16 10 7 -10 9 7 -9 9 7 9 10 7 10
  [4,16,10,7,-10,9,7,-9,9,7,9,10,7,10],
// 0
];
module ldraw_lib__s__3070bs01(step=0, col=false, unit=2/5, alt=false, line=0.2, solid=!$preview)
    makepoly(ldraw_lib__s__3070bs01(solid), step=step, col=col, unit=unit, alt=alt, line=line, solid=solid);
ldraw_lib__s__3070bs01(line=0.2);
// main file
use <../lib.scad>
use <s/3070bs01.scad>
$fa=1; $fs=0.2;
function ldraw_lib__3070bp0v(realsolid=false) = [
// 0 Tile  1 x  1 with Coral 'LOVE' on Magenta Background Pattern
// 0 Name: 3070bp0v.dat
// 0 Author: Philippe Hurbain [Philo]
// 0 !LDRAW_ORG Part UPDATE 2020-03
// 0 !LICENSE Licensed under CC BY 2.0 and CC BY 4.0 : see CAreadme.txt
// 
// 0 BFC CERTIFY CCW
  [0,"BFC","CERTIFY"],
  [0,"BFC","CCW"],
// 
// 0 !KEYWORDS Bricklink 3070bpb147, Dots, Set 41916
// 
// 0 !HISTORY 2020-12-29 [PTadmin] Official Update 2020-03
// 
// 
// 1 16 0 0 0 1 0 0 0 1 0 0 0 1 s\3070bs01.dat
  [1,16,0,0,0,1,0,0,0,1,0,0,0,1, ldraw_lib__s__3070bs01(realsolid)],
// 4 16 -10 0 -10 10 0 -10 -1.54 0 -9 -4.91 0 -9
  [4,16,-10,0,-10,10,0,-10,-1.54,0,-9,-4.91,0,-9],
// 4 353 3.09 0 -0.42 6 0 -3.93 6 0 -2.81 4.77 0 -0.13
  [4,353,3.09,0,-0.42,6,0,-3.93,6,0,-2.81,4.77,0,-0.13],
// 3 16 -4.91 0 -9 -9 0 -9 -10 0 -10
  [3,16,-4.91,0,-9,-9,0,-9,-10,0,-10],
// 4 26 -9 0 -9 -4.91 0 -9 -8.28 0 -0.2 -9 0 -0.2
  [4,26,-9,0,-9,-4.91,0,-9,-8.28,0,-0.2,-9,0,-0.2],
// 4 16 6.33 0 9 9 0 9 10 0 10 -10 0 10
  [4,16,6.33,0,9,9,0,9,10,0,10,-10,0,10],
// 4 16 -10 0 10 -10 0 -10 -9 0 -9 -9 0 -0.2
  [4,16,-10,0,10,-10,0,-10,-9,0,-9,-9,0,-0.2],
// 4 353 -9 0 9 -9 0 -0.2 -5.75 0 2.53 -5.75 0 9
  [4,353,-9,0,9,-9,0,-0.2,-5.75,0,2.53,-5.75,0,9],
// 4 353 -3.19 0 -4.49 -8.28 0 -0.2 -4.91 0 -9 -1.54 0 -9
  [4,353,-3.19,0,-4.49,-8.28,0,-0.2,-4.91,0,-9,-1.54,0,-9],
// 4 26 -3.09 0 2.53 -3.09 0 -0.2 -1.4 0 0.28 -0.89 0 1.36
  [4,26,-3.09,0,2.53,-3.09,0,-0.2,-1.4,0,0.28,-0.89,0,1.36],
// 3 16 3.09 0 -9 -1.54 0 -9 10 0 -10
  [3,16,3.09,0,-9,-1.54,0,-9,10,0,-10],
// 4 353 2.2 0 2.84 0.42 0 0.29 1.96 0 -0.28 3.22 0 2.71
  [4,353,2.2,0,2.84,0.42,0,0.29,1.96,0,-0.28,3.22,0,2.71],
// 4 26 3.09 0 -0.42 1.96 0 -0.28 -1.54 0 -9 3.09 0 -9
  [4,26,3.09,0,-0.42,1.96,0,-0.28,-1.54,0,-9,3.09,0,-9],
// 4 26 -5.75 0 2.53 -2.07 0 6.15 -1.41 0 7.71 -5.75 0 9
  [4,26,-5.75,0,2.53,-2.07,0,6.15,-1.41,0,7.71,-5.75,0,9],
// 3 16 9 0 -7.54 9 0 -9 10 0 -10
  [3,16,9,0,-7.54,9,0,-9,10,0,-10],
// 3 16 9 0 -2.81 9 0 -7.54 10 0 -10
  [3,16,9,0,-2.81,9,0,-7.54,10,0,-10],
// 4 353 6 0 -7.58 3.09 0 -9 9 0 -9 9 0 -7.54
  [4,353,6,0,-7.58,3.09,0,-9,9,0,-9,9,0,-7.54],
// 3 16 9 0 -9 3.09 0 -9 10 0 -10
  [3,16,9,0,-9,3.09,0,-9,10,0,-10],
// 4 353 8 0 -6.32 8 0 -3.93 6 0 -3.93 6 0 -6.32
  [4,353,8,0,-6.32,8,0,-3.93,6,0,-3.93,6,0,-6.32],
// 4 16 9 0 -0.14 9 0 -2.81 10 0 -10 10 0 10
  [4,16,9,0,-0.14,9,0,-2.81,10,0,-10,10,0,10],
// 4 26 9 0 -7.54 9 0 -2.81 8 0 -3.93 8 0 -6.32
  [4,26,9,0,-7.54,9,0,-2.81,8,0,-3.93,8,0,-6.32],
// 4 26 8 0 -3.93 9 0 -2.81 6 0 -2.81 6 0 -3.93
  [4,26,8,0,-3.93,9,0,-2.81,6,0,-2.81,6,0,-3.93],
// 4 353 6 0 -3.93 3.09 0 -0.42 3.09 0 -9 6 0 -6.32
  [4,353,6,0,-3.93,3.09,0,-0.42,3.09,0,-9,6,0,-6.32],
// 4 26 6 0 -7.58 9 0 -7.54 8 0 -6.32 6 0 -6.32
  [4,26,6,0,-7.58,9,0,-7.54,8,0,-6.32,6,0,-6.32],
// 3 353 6 0 -6.32 3.09 0 -9 6 0 -7.58
  [3,353,6,0,-6.32,3.09,0,-9,6,0,-7.58],
// 4 353 6 0 -2.81 9 0 -2.81 9 0 -0.14 4.77 0 -0.13
  [4,353,6,0,-2.81,9,0,-2.81,9,0,-0.14,4.77,0,-0.13],
// 4 353 5.1 0 4.84 8.24 0 3.97 8.23 0 5.84 4.85 0 5.83
  [4,353,5.1,0,4.84,8.24,0,3.97,8.23,0,5.84,4.85,0,5.83],
// 3 16 10 0 10 9 0 9 9 0 -0.14
  [3,16,10,0,10,9,0,9,9,0,-0.14],
// 3 26 9 0 9 7.56 0 7.59 8.23 0 5.84
  [3,26,9,0,9,7.56,0,7.59,8.23,0,5.84],
// 4 26 9 0 9 8.23 0 5.84 8.24 0 3.97 9 0 -0.14
  [4,26,9,0,9,8.23,0,5.84,8.24,0,3.97,9,0,-0.14],
// 4 353 7.6 0 2.22 8.24 0 3.97 4.85 0 3.84 6.4 0 0.79
  [4,353,7.6,0,2.22,8.24,0,3.97,4.85,0,3.84,6.4,0,0.79],
// 3 26 8.24 0 3.97 7.6 0 2.22 9 0 -0.14
  [3,26,8.24,0,3.97,7.6,0,2.22,9,0,-0.14],
// 3 26 7.6 0 2.22 6.4 0 0.79 9 0 -0.14
  [3,26,7.6,0,2.22,6.4,0,0.79,9,0,-0.14],
// 4 353 4.17 0 3.08 4.77 0 -0.13 6.4 0 0.79 4.85 0 3.84
  [4,353,4.17,0,3.08,4.77,0,-0.13,6.4,0,0.79,4.85,0,3.84],
// 3 26 6.4 0 0.79 4.77 0 -0.13 9 0 -0.14
  [3,26,6.4,0,0.79,4.77,0,-0.13,9,0,-0.14],
// 4 353 3.09 0 -0.42 4.77 0 -0.13 3.22 0 2.71 1.96 0 -0.28
  [4,353,3.09,0,-0.42,4.77,0,-0.13,3.22,0,2.71,1.96,0,-0.28],
// 4 353 4.85 0 5.83 8.23 0 5.84 7.56 0 7.59 4.17 0 6.6
  [4,353,4.85,0,5.83,8.23,0,5.84,7.56,0,7.59,4.17,0,6.6],
// 4 26 -2.2 0 4.45 -2.07 0 6.15 -5.75 0 2.53 -3.09 0 2.53
  [4,26,-2.2,0,4.45,-2.07,0,6.15,-5.75,0,2.53,-3.09,0,2.53],
// 4 353 1.36 0 6.25 -0.28 0 9 -1.41 0 7.71 0.88 0 5.35
  [4,353,1.36,0,6.25,-0.28,0,9,-1.41,0,7.71,0.88,0,5.35],
// 4 353 -2.07 0 6.15 -2.2 0 4.45 0.88 0 5.35 -1.41 0 7.71
  [4,353,-2.07,0,6.15,-2.2,0,4.45,0.88,0,5.35,-1.41,0,7.71],
// 3 26 -1.8 0 2.8 -3.09 0 2.53 -0.89 0 1.36
  [3,26,-1.8,0,2.8,-3.09,0,2.53,-0.89,0,1.36],
// 4 353 0.88 0 4.32 -2.2 0 4.45 -1.8 0 2.8 1.36 0 3.42
  [4,353,0.88,0,4.32,-2.2,0,4.45,-1.8,0,2.8,1.36,0,3.42],
// 4 353 1.36 0 3.42 -1.8 0 2.8 -0.89 0 1.36 0.42 0 0.29
  [4,353,1.36,0,3.42,-1.8,0,2.8,-0.89,0,1.36,0.42,0,0.29],
// 4 353 -3.19 0 -4.49 -1.54 0 -9 1.96 0 -0.28 0.42 0 0.29
  [4,353,-3.19,0,-4.49,-1.54,0,-9,1.96,0,-0.28,0.42,0,0.29],
// 3 26 -0.89 0 1.36 -1.4 0 0.28 0.42 0 0.29
  [3,26,-0.89,0,1.36,-1.4,0,0.28,0.42,0,0.29],
// 3 353 0.42 0 0.29 -1.4 0 0.28 -3.19 0 -4.49
  [3,353,0.42,0,0.29,-1.4,0,0.28,-3.19,0,-4.49],
// 3 353 -4.91 0 -0.2 -8.28 0 -0.2 -3.19 0 -4.49
  [3,353,-4.91,0,-0.2,-8.28,0,-0.2,-3.19,0,-4.49],
// 3 26 -3.09 0 -0.2 -4.91 0 -0.2 -3.19 0 -4.49
  [3,26,-3.09,0,-0.2,-4.91,0,-0.2,-3.19,0,-4.49],
// 4 353 -3.09 0 2.53 -5.75 0 2.53 -4.91 0 -0.2 -3.09 0 -0.2
  [4,353,-3.09,0,2.53,-5.75,0,2.53,-4.91,0,-0.2,-3.09,0,-0.2],
// 3 26 -1.4 0 0.28 -3.09 0 -0.2 -3.19 0 -4.49
  [3,26,-1.4,0,0.28,-3.09,0,-0.2,-3.19,0,-4.49],
// 3 26 -2.2 0 4.45 -3.09 0 2.53 -1.8 0 2.8
  [3,26,-2.2,0,4.45,-3.09,0,2.53,-1.8,0,2.8],
// 3 353 -5.75 0 2.53 -8.28 0 -0.2 -4.91 0 -0.2
  [3,353,-5.75,0,2.53,-8.28,0,-0.2,-4.91,0,-0.2],
// 3 353 -5.75 0 2.53 -9 0 -0.2 -8.28 0 -0.2
  [3,353,-5.75,0,2.53,-9,0,-0.2,-8.28,0,-0.2],
// 3 26 -0.28 0 9 -5.75 0 9 -1.41 0 7.71
  [3,26,-0.28,0,9,-5.75,0,9,-1.41,0,7.71],
// 3 353 5.1 0 4.84 4.85 0 3.84 8.24 0 3.97
  [3,353,5.1,0,4.84,4.85,0,3.84,8.24,0,3.97],
// 4 26 4.17 0 3.08 4.85 0 3.84 2.2 0 6.84 2.2 0 2.84
  [4,26,4.17,0,3.08,4.85,0,3.84,2.2,0,6.84,2.2,0,2.84],
// 3 353 4.17 0 3.08 3.22 0 2.71 4.77 0 -0.13
  [3,353,4.17,0,3.08,3.22,0,2.71,4.77,0,-0.13],
// 3 26 4.17 0 3.08 2.2 0 2.84 3.22 0 2.71
  [3,26,4.17,0,3.08,2.2,0,2.84,3.22,0,2.71],
// 3 353 1.36 0 3.42 0.42 0 0.29 2.2 0 2.84
  [3,353,1.36,0,3.42,0.42,0,0.29,2.2,0,2.84],
// 4 26 0.88 0 4.32 1.36 0 3.42 2.2 0 6.84 0.88 0 5.35
  [4,26,0.88,0,4.32,1.36,0,3.42,2.2,0,6.84,0.88,0,5.35],
// 3 353 0.88 0 5.35 -2.2 0 4.45 0.88 0 4.32
  [3,353,0.88,0,5.35,-2.2,0,4.45,0.88,0,4.32],
// 3 26 2.2 0 6.84 1.36 0 6.25 0.88 0 5.35
  [3,26,2.2,0,6.84,1.36,0,6.25,0.88,0,5.35],
// 3 26 2.2 0 6.84 1.36 0 3.42 2.2 0 2.84
  [3,26,2.2,0,6.84,1.36,0,3.42,2.2,0,2.84],
// 3 353 -0.28 0 9 1.36 0 6.25 2.2 0 6.84
  [3,353,-0.28,0,9,1.36,0,6.25,2.2,0,6.84],
// 4 26 2.2 0 6.84 4.85 0 3.84 5.1 0 4.84 4.17 0 6.6
  [4,26,2.2,0,6.84,4.85,0,3.84,5.1,0,4.84,4.17,0,6.6],
// 4 353 -0.28 0 9 2.2 0 6.84 3.22 0 6.96 6.33 0 9
  [4,353,-0.28,0,9,2.2,0,6.84,3.22,0,6.96,6.33,0,9],
// 3 26 3.22 0 6.96 2.2 0 6.84 4.17 0 6.6
  [3,26,3.22,0,6.96,2.2,0,6.84,4.17,0,6.6],
// 4 353 3.22 0 6.96 4.17 0 6.6 7.56 0 7.59 6.33 0 9
  [4,353,3.22,0,6.96,4.17,0,6.6,7.56,0,7.59,6.33,0,9],
// 3 26 4.17 0 6.6 5.1 0 4.84 4.85 0 5.83
  [3,26,4.17,0,6.6,5.1,0,4.84,4.85,0,5.83],
// 3 16 -10 0 10 -9 0 9 -5.75 0 9
  [3,16,-10,0,10,-9,0,9,-5.75,0,9],
// 3 16 -10 0 10 -0.28 0 9 6.33 0 9
  [3,16,-10,0,10,-0.28,0,9,6.33,0,9],
// 3 16 -10 0 10 -5.75 0 9 -0.28 0 9
  [3,16,-10,0,10,-5.75,0,9,-0.28,0,9],
// 3 26 6.33 0 9 7.56 0 7.59 9 0 9
  [3,26,6.33,0,9,7.56,0,7.59,9,0,9],
// 3 16 -10 0 10 -9 0 -0.2 -9 0 9
  [3,16,-10,0,10,-9,0,-0.2,-9,0,9],
];
module ldraw_lib__3070bp0v(step=0, col=false, unit=2/5, alt=false, line=0.2, solid=!$preview)
    makepoly(ldraw_lib__3070bp0v(solid), step=step, col=col, unit=unit, alt=alt, line=line, solid=solid);
ldraw_lib__3070bp0v(line=0.2);
